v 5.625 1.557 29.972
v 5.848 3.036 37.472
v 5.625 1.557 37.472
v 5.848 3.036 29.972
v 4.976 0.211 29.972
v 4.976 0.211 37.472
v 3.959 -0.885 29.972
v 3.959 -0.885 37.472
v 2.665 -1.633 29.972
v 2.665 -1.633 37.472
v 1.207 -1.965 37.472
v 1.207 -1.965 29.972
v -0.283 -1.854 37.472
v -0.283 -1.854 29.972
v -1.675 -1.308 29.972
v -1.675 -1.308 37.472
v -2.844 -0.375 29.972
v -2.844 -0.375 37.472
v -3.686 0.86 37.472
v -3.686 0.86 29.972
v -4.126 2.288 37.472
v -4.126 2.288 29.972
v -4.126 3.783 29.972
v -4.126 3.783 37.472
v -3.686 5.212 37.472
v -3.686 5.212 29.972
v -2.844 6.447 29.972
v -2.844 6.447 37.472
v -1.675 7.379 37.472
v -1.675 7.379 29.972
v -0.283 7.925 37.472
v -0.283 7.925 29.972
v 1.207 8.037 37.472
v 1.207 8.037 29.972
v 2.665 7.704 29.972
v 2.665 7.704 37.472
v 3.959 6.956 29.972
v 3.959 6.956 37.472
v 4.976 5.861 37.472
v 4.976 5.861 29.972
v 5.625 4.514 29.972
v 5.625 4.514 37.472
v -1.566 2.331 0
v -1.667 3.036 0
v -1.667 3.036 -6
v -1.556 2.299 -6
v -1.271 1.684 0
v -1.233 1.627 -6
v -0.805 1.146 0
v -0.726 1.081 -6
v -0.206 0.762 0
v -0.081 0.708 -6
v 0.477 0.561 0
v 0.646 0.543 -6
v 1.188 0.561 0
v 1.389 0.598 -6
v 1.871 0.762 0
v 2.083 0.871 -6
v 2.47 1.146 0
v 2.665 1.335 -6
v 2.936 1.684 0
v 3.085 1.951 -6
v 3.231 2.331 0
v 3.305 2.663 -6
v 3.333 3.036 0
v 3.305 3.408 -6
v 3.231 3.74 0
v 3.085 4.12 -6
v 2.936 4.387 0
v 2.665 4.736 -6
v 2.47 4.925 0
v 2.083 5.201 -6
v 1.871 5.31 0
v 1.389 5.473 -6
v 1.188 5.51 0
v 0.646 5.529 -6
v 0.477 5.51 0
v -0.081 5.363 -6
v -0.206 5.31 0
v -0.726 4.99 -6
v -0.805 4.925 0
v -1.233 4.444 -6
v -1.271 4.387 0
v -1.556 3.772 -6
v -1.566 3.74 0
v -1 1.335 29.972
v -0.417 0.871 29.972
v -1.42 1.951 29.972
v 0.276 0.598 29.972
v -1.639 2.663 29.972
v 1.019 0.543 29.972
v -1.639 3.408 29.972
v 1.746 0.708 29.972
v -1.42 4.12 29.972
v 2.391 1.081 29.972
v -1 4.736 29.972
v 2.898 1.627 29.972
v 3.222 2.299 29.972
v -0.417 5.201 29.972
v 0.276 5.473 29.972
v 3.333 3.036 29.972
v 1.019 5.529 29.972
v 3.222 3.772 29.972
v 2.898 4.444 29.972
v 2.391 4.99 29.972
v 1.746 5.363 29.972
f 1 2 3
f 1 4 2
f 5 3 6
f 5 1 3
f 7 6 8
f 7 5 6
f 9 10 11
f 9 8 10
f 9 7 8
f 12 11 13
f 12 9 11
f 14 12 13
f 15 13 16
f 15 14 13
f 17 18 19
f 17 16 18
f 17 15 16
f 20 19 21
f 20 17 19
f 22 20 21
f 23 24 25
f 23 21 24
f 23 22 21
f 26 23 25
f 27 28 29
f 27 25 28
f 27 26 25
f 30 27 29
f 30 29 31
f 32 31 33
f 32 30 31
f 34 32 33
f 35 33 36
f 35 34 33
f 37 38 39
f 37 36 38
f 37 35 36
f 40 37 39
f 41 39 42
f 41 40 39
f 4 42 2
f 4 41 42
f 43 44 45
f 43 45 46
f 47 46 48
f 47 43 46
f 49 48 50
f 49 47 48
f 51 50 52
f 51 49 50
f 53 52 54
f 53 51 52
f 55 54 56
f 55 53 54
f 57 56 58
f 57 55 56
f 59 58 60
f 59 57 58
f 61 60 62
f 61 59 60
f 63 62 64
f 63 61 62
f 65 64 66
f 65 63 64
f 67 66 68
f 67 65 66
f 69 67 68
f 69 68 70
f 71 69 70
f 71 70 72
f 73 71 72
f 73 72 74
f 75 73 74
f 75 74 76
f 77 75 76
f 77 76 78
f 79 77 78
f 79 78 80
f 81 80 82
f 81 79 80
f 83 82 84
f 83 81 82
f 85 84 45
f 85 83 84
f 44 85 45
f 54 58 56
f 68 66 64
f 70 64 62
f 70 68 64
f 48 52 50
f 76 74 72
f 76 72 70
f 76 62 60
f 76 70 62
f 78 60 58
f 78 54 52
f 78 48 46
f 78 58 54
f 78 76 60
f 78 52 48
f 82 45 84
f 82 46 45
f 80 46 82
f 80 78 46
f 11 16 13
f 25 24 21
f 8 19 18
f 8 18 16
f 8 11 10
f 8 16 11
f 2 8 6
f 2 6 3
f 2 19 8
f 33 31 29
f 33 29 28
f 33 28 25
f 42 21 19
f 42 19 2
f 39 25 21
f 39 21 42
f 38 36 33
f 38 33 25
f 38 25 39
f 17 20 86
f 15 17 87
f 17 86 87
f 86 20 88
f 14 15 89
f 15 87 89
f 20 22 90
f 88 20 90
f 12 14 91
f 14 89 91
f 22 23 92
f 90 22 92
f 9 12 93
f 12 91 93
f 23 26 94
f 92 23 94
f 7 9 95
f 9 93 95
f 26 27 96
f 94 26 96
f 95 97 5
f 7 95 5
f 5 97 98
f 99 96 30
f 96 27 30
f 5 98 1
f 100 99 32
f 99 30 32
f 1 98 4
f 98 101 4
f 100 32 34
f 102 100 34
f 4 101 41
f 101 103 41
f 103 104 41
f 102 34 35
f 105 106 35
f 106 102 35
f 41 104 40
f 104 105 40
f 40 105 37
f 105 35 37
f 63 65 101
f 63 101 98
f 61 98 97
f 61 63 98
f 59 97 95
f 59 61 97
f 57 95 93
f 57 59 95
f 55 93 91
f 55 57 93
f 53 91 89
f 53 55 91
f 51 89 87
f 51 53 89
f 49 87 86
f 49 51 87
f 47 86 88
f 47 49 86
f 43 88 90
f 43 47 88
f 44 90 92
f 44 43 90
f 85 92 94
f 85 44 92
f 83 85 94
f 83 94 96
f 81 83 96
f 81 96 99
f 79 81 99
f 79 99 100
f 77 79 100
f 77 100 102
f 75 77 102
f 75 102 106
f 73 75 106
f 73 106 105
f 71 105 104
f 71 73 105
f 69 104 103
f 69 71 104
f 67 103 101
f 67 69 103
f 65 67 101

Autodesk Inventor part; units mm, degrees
ref_plane "YZ Plane" through (0, 0, 0) normal (1, 0, 0) x (0, 1, 0)
ref_plane "XZ Plane" through (0, 0, 0) normal (0, 1, 0) x (-1, 0, 0)
ref_plane "XY Plane" through (0, 0, 0) normal (0, 0, 1) x (1, 0, 0)
sketch "Sketch1" plane through (0, 0, 0) normal (0, 0, 1) x (1, 0, 0)
  circle A0 centre (0.8326, 3.0356) radius 2.5
  point P0 (0, 0)
  dimension "d0" = 5
extrude "Extrusion1" add sketch "Sketch1" along normal blind 29.972
sketch "Sketch2" plane through (0.8326, 3.0356, 29.972) normal (0, 0, 1) x (1, 0, 0)
  circle A0 centre (0, 0) radius 2.5 projected
  circle A1 centre (0, 0) radius 5.015
  point P0 (-0.8326, -3.0356)
extrude "Extrusion2" add sketch "Sketch2" along normal blind 7.5 contours A0 | A1
sketch "Sketch3" plane through (0.8326, 3.0356, 0) normal (0, 0, -1) x (-1, 0, 0)
  circle A0 centre (0, 0) radius 5.015 projected
  circle A1 centre (0, 0) radius 2.5 projected
  circle A2 centre (0, 0) radius 2.5 projected
  point P0 (0.8326, -3.0356)
extrude "Extrusion3" add sketch "Sketch3" along normal blind 6 contours A1
properties part number "5mm_bolt" material "Steel, Alloy"
